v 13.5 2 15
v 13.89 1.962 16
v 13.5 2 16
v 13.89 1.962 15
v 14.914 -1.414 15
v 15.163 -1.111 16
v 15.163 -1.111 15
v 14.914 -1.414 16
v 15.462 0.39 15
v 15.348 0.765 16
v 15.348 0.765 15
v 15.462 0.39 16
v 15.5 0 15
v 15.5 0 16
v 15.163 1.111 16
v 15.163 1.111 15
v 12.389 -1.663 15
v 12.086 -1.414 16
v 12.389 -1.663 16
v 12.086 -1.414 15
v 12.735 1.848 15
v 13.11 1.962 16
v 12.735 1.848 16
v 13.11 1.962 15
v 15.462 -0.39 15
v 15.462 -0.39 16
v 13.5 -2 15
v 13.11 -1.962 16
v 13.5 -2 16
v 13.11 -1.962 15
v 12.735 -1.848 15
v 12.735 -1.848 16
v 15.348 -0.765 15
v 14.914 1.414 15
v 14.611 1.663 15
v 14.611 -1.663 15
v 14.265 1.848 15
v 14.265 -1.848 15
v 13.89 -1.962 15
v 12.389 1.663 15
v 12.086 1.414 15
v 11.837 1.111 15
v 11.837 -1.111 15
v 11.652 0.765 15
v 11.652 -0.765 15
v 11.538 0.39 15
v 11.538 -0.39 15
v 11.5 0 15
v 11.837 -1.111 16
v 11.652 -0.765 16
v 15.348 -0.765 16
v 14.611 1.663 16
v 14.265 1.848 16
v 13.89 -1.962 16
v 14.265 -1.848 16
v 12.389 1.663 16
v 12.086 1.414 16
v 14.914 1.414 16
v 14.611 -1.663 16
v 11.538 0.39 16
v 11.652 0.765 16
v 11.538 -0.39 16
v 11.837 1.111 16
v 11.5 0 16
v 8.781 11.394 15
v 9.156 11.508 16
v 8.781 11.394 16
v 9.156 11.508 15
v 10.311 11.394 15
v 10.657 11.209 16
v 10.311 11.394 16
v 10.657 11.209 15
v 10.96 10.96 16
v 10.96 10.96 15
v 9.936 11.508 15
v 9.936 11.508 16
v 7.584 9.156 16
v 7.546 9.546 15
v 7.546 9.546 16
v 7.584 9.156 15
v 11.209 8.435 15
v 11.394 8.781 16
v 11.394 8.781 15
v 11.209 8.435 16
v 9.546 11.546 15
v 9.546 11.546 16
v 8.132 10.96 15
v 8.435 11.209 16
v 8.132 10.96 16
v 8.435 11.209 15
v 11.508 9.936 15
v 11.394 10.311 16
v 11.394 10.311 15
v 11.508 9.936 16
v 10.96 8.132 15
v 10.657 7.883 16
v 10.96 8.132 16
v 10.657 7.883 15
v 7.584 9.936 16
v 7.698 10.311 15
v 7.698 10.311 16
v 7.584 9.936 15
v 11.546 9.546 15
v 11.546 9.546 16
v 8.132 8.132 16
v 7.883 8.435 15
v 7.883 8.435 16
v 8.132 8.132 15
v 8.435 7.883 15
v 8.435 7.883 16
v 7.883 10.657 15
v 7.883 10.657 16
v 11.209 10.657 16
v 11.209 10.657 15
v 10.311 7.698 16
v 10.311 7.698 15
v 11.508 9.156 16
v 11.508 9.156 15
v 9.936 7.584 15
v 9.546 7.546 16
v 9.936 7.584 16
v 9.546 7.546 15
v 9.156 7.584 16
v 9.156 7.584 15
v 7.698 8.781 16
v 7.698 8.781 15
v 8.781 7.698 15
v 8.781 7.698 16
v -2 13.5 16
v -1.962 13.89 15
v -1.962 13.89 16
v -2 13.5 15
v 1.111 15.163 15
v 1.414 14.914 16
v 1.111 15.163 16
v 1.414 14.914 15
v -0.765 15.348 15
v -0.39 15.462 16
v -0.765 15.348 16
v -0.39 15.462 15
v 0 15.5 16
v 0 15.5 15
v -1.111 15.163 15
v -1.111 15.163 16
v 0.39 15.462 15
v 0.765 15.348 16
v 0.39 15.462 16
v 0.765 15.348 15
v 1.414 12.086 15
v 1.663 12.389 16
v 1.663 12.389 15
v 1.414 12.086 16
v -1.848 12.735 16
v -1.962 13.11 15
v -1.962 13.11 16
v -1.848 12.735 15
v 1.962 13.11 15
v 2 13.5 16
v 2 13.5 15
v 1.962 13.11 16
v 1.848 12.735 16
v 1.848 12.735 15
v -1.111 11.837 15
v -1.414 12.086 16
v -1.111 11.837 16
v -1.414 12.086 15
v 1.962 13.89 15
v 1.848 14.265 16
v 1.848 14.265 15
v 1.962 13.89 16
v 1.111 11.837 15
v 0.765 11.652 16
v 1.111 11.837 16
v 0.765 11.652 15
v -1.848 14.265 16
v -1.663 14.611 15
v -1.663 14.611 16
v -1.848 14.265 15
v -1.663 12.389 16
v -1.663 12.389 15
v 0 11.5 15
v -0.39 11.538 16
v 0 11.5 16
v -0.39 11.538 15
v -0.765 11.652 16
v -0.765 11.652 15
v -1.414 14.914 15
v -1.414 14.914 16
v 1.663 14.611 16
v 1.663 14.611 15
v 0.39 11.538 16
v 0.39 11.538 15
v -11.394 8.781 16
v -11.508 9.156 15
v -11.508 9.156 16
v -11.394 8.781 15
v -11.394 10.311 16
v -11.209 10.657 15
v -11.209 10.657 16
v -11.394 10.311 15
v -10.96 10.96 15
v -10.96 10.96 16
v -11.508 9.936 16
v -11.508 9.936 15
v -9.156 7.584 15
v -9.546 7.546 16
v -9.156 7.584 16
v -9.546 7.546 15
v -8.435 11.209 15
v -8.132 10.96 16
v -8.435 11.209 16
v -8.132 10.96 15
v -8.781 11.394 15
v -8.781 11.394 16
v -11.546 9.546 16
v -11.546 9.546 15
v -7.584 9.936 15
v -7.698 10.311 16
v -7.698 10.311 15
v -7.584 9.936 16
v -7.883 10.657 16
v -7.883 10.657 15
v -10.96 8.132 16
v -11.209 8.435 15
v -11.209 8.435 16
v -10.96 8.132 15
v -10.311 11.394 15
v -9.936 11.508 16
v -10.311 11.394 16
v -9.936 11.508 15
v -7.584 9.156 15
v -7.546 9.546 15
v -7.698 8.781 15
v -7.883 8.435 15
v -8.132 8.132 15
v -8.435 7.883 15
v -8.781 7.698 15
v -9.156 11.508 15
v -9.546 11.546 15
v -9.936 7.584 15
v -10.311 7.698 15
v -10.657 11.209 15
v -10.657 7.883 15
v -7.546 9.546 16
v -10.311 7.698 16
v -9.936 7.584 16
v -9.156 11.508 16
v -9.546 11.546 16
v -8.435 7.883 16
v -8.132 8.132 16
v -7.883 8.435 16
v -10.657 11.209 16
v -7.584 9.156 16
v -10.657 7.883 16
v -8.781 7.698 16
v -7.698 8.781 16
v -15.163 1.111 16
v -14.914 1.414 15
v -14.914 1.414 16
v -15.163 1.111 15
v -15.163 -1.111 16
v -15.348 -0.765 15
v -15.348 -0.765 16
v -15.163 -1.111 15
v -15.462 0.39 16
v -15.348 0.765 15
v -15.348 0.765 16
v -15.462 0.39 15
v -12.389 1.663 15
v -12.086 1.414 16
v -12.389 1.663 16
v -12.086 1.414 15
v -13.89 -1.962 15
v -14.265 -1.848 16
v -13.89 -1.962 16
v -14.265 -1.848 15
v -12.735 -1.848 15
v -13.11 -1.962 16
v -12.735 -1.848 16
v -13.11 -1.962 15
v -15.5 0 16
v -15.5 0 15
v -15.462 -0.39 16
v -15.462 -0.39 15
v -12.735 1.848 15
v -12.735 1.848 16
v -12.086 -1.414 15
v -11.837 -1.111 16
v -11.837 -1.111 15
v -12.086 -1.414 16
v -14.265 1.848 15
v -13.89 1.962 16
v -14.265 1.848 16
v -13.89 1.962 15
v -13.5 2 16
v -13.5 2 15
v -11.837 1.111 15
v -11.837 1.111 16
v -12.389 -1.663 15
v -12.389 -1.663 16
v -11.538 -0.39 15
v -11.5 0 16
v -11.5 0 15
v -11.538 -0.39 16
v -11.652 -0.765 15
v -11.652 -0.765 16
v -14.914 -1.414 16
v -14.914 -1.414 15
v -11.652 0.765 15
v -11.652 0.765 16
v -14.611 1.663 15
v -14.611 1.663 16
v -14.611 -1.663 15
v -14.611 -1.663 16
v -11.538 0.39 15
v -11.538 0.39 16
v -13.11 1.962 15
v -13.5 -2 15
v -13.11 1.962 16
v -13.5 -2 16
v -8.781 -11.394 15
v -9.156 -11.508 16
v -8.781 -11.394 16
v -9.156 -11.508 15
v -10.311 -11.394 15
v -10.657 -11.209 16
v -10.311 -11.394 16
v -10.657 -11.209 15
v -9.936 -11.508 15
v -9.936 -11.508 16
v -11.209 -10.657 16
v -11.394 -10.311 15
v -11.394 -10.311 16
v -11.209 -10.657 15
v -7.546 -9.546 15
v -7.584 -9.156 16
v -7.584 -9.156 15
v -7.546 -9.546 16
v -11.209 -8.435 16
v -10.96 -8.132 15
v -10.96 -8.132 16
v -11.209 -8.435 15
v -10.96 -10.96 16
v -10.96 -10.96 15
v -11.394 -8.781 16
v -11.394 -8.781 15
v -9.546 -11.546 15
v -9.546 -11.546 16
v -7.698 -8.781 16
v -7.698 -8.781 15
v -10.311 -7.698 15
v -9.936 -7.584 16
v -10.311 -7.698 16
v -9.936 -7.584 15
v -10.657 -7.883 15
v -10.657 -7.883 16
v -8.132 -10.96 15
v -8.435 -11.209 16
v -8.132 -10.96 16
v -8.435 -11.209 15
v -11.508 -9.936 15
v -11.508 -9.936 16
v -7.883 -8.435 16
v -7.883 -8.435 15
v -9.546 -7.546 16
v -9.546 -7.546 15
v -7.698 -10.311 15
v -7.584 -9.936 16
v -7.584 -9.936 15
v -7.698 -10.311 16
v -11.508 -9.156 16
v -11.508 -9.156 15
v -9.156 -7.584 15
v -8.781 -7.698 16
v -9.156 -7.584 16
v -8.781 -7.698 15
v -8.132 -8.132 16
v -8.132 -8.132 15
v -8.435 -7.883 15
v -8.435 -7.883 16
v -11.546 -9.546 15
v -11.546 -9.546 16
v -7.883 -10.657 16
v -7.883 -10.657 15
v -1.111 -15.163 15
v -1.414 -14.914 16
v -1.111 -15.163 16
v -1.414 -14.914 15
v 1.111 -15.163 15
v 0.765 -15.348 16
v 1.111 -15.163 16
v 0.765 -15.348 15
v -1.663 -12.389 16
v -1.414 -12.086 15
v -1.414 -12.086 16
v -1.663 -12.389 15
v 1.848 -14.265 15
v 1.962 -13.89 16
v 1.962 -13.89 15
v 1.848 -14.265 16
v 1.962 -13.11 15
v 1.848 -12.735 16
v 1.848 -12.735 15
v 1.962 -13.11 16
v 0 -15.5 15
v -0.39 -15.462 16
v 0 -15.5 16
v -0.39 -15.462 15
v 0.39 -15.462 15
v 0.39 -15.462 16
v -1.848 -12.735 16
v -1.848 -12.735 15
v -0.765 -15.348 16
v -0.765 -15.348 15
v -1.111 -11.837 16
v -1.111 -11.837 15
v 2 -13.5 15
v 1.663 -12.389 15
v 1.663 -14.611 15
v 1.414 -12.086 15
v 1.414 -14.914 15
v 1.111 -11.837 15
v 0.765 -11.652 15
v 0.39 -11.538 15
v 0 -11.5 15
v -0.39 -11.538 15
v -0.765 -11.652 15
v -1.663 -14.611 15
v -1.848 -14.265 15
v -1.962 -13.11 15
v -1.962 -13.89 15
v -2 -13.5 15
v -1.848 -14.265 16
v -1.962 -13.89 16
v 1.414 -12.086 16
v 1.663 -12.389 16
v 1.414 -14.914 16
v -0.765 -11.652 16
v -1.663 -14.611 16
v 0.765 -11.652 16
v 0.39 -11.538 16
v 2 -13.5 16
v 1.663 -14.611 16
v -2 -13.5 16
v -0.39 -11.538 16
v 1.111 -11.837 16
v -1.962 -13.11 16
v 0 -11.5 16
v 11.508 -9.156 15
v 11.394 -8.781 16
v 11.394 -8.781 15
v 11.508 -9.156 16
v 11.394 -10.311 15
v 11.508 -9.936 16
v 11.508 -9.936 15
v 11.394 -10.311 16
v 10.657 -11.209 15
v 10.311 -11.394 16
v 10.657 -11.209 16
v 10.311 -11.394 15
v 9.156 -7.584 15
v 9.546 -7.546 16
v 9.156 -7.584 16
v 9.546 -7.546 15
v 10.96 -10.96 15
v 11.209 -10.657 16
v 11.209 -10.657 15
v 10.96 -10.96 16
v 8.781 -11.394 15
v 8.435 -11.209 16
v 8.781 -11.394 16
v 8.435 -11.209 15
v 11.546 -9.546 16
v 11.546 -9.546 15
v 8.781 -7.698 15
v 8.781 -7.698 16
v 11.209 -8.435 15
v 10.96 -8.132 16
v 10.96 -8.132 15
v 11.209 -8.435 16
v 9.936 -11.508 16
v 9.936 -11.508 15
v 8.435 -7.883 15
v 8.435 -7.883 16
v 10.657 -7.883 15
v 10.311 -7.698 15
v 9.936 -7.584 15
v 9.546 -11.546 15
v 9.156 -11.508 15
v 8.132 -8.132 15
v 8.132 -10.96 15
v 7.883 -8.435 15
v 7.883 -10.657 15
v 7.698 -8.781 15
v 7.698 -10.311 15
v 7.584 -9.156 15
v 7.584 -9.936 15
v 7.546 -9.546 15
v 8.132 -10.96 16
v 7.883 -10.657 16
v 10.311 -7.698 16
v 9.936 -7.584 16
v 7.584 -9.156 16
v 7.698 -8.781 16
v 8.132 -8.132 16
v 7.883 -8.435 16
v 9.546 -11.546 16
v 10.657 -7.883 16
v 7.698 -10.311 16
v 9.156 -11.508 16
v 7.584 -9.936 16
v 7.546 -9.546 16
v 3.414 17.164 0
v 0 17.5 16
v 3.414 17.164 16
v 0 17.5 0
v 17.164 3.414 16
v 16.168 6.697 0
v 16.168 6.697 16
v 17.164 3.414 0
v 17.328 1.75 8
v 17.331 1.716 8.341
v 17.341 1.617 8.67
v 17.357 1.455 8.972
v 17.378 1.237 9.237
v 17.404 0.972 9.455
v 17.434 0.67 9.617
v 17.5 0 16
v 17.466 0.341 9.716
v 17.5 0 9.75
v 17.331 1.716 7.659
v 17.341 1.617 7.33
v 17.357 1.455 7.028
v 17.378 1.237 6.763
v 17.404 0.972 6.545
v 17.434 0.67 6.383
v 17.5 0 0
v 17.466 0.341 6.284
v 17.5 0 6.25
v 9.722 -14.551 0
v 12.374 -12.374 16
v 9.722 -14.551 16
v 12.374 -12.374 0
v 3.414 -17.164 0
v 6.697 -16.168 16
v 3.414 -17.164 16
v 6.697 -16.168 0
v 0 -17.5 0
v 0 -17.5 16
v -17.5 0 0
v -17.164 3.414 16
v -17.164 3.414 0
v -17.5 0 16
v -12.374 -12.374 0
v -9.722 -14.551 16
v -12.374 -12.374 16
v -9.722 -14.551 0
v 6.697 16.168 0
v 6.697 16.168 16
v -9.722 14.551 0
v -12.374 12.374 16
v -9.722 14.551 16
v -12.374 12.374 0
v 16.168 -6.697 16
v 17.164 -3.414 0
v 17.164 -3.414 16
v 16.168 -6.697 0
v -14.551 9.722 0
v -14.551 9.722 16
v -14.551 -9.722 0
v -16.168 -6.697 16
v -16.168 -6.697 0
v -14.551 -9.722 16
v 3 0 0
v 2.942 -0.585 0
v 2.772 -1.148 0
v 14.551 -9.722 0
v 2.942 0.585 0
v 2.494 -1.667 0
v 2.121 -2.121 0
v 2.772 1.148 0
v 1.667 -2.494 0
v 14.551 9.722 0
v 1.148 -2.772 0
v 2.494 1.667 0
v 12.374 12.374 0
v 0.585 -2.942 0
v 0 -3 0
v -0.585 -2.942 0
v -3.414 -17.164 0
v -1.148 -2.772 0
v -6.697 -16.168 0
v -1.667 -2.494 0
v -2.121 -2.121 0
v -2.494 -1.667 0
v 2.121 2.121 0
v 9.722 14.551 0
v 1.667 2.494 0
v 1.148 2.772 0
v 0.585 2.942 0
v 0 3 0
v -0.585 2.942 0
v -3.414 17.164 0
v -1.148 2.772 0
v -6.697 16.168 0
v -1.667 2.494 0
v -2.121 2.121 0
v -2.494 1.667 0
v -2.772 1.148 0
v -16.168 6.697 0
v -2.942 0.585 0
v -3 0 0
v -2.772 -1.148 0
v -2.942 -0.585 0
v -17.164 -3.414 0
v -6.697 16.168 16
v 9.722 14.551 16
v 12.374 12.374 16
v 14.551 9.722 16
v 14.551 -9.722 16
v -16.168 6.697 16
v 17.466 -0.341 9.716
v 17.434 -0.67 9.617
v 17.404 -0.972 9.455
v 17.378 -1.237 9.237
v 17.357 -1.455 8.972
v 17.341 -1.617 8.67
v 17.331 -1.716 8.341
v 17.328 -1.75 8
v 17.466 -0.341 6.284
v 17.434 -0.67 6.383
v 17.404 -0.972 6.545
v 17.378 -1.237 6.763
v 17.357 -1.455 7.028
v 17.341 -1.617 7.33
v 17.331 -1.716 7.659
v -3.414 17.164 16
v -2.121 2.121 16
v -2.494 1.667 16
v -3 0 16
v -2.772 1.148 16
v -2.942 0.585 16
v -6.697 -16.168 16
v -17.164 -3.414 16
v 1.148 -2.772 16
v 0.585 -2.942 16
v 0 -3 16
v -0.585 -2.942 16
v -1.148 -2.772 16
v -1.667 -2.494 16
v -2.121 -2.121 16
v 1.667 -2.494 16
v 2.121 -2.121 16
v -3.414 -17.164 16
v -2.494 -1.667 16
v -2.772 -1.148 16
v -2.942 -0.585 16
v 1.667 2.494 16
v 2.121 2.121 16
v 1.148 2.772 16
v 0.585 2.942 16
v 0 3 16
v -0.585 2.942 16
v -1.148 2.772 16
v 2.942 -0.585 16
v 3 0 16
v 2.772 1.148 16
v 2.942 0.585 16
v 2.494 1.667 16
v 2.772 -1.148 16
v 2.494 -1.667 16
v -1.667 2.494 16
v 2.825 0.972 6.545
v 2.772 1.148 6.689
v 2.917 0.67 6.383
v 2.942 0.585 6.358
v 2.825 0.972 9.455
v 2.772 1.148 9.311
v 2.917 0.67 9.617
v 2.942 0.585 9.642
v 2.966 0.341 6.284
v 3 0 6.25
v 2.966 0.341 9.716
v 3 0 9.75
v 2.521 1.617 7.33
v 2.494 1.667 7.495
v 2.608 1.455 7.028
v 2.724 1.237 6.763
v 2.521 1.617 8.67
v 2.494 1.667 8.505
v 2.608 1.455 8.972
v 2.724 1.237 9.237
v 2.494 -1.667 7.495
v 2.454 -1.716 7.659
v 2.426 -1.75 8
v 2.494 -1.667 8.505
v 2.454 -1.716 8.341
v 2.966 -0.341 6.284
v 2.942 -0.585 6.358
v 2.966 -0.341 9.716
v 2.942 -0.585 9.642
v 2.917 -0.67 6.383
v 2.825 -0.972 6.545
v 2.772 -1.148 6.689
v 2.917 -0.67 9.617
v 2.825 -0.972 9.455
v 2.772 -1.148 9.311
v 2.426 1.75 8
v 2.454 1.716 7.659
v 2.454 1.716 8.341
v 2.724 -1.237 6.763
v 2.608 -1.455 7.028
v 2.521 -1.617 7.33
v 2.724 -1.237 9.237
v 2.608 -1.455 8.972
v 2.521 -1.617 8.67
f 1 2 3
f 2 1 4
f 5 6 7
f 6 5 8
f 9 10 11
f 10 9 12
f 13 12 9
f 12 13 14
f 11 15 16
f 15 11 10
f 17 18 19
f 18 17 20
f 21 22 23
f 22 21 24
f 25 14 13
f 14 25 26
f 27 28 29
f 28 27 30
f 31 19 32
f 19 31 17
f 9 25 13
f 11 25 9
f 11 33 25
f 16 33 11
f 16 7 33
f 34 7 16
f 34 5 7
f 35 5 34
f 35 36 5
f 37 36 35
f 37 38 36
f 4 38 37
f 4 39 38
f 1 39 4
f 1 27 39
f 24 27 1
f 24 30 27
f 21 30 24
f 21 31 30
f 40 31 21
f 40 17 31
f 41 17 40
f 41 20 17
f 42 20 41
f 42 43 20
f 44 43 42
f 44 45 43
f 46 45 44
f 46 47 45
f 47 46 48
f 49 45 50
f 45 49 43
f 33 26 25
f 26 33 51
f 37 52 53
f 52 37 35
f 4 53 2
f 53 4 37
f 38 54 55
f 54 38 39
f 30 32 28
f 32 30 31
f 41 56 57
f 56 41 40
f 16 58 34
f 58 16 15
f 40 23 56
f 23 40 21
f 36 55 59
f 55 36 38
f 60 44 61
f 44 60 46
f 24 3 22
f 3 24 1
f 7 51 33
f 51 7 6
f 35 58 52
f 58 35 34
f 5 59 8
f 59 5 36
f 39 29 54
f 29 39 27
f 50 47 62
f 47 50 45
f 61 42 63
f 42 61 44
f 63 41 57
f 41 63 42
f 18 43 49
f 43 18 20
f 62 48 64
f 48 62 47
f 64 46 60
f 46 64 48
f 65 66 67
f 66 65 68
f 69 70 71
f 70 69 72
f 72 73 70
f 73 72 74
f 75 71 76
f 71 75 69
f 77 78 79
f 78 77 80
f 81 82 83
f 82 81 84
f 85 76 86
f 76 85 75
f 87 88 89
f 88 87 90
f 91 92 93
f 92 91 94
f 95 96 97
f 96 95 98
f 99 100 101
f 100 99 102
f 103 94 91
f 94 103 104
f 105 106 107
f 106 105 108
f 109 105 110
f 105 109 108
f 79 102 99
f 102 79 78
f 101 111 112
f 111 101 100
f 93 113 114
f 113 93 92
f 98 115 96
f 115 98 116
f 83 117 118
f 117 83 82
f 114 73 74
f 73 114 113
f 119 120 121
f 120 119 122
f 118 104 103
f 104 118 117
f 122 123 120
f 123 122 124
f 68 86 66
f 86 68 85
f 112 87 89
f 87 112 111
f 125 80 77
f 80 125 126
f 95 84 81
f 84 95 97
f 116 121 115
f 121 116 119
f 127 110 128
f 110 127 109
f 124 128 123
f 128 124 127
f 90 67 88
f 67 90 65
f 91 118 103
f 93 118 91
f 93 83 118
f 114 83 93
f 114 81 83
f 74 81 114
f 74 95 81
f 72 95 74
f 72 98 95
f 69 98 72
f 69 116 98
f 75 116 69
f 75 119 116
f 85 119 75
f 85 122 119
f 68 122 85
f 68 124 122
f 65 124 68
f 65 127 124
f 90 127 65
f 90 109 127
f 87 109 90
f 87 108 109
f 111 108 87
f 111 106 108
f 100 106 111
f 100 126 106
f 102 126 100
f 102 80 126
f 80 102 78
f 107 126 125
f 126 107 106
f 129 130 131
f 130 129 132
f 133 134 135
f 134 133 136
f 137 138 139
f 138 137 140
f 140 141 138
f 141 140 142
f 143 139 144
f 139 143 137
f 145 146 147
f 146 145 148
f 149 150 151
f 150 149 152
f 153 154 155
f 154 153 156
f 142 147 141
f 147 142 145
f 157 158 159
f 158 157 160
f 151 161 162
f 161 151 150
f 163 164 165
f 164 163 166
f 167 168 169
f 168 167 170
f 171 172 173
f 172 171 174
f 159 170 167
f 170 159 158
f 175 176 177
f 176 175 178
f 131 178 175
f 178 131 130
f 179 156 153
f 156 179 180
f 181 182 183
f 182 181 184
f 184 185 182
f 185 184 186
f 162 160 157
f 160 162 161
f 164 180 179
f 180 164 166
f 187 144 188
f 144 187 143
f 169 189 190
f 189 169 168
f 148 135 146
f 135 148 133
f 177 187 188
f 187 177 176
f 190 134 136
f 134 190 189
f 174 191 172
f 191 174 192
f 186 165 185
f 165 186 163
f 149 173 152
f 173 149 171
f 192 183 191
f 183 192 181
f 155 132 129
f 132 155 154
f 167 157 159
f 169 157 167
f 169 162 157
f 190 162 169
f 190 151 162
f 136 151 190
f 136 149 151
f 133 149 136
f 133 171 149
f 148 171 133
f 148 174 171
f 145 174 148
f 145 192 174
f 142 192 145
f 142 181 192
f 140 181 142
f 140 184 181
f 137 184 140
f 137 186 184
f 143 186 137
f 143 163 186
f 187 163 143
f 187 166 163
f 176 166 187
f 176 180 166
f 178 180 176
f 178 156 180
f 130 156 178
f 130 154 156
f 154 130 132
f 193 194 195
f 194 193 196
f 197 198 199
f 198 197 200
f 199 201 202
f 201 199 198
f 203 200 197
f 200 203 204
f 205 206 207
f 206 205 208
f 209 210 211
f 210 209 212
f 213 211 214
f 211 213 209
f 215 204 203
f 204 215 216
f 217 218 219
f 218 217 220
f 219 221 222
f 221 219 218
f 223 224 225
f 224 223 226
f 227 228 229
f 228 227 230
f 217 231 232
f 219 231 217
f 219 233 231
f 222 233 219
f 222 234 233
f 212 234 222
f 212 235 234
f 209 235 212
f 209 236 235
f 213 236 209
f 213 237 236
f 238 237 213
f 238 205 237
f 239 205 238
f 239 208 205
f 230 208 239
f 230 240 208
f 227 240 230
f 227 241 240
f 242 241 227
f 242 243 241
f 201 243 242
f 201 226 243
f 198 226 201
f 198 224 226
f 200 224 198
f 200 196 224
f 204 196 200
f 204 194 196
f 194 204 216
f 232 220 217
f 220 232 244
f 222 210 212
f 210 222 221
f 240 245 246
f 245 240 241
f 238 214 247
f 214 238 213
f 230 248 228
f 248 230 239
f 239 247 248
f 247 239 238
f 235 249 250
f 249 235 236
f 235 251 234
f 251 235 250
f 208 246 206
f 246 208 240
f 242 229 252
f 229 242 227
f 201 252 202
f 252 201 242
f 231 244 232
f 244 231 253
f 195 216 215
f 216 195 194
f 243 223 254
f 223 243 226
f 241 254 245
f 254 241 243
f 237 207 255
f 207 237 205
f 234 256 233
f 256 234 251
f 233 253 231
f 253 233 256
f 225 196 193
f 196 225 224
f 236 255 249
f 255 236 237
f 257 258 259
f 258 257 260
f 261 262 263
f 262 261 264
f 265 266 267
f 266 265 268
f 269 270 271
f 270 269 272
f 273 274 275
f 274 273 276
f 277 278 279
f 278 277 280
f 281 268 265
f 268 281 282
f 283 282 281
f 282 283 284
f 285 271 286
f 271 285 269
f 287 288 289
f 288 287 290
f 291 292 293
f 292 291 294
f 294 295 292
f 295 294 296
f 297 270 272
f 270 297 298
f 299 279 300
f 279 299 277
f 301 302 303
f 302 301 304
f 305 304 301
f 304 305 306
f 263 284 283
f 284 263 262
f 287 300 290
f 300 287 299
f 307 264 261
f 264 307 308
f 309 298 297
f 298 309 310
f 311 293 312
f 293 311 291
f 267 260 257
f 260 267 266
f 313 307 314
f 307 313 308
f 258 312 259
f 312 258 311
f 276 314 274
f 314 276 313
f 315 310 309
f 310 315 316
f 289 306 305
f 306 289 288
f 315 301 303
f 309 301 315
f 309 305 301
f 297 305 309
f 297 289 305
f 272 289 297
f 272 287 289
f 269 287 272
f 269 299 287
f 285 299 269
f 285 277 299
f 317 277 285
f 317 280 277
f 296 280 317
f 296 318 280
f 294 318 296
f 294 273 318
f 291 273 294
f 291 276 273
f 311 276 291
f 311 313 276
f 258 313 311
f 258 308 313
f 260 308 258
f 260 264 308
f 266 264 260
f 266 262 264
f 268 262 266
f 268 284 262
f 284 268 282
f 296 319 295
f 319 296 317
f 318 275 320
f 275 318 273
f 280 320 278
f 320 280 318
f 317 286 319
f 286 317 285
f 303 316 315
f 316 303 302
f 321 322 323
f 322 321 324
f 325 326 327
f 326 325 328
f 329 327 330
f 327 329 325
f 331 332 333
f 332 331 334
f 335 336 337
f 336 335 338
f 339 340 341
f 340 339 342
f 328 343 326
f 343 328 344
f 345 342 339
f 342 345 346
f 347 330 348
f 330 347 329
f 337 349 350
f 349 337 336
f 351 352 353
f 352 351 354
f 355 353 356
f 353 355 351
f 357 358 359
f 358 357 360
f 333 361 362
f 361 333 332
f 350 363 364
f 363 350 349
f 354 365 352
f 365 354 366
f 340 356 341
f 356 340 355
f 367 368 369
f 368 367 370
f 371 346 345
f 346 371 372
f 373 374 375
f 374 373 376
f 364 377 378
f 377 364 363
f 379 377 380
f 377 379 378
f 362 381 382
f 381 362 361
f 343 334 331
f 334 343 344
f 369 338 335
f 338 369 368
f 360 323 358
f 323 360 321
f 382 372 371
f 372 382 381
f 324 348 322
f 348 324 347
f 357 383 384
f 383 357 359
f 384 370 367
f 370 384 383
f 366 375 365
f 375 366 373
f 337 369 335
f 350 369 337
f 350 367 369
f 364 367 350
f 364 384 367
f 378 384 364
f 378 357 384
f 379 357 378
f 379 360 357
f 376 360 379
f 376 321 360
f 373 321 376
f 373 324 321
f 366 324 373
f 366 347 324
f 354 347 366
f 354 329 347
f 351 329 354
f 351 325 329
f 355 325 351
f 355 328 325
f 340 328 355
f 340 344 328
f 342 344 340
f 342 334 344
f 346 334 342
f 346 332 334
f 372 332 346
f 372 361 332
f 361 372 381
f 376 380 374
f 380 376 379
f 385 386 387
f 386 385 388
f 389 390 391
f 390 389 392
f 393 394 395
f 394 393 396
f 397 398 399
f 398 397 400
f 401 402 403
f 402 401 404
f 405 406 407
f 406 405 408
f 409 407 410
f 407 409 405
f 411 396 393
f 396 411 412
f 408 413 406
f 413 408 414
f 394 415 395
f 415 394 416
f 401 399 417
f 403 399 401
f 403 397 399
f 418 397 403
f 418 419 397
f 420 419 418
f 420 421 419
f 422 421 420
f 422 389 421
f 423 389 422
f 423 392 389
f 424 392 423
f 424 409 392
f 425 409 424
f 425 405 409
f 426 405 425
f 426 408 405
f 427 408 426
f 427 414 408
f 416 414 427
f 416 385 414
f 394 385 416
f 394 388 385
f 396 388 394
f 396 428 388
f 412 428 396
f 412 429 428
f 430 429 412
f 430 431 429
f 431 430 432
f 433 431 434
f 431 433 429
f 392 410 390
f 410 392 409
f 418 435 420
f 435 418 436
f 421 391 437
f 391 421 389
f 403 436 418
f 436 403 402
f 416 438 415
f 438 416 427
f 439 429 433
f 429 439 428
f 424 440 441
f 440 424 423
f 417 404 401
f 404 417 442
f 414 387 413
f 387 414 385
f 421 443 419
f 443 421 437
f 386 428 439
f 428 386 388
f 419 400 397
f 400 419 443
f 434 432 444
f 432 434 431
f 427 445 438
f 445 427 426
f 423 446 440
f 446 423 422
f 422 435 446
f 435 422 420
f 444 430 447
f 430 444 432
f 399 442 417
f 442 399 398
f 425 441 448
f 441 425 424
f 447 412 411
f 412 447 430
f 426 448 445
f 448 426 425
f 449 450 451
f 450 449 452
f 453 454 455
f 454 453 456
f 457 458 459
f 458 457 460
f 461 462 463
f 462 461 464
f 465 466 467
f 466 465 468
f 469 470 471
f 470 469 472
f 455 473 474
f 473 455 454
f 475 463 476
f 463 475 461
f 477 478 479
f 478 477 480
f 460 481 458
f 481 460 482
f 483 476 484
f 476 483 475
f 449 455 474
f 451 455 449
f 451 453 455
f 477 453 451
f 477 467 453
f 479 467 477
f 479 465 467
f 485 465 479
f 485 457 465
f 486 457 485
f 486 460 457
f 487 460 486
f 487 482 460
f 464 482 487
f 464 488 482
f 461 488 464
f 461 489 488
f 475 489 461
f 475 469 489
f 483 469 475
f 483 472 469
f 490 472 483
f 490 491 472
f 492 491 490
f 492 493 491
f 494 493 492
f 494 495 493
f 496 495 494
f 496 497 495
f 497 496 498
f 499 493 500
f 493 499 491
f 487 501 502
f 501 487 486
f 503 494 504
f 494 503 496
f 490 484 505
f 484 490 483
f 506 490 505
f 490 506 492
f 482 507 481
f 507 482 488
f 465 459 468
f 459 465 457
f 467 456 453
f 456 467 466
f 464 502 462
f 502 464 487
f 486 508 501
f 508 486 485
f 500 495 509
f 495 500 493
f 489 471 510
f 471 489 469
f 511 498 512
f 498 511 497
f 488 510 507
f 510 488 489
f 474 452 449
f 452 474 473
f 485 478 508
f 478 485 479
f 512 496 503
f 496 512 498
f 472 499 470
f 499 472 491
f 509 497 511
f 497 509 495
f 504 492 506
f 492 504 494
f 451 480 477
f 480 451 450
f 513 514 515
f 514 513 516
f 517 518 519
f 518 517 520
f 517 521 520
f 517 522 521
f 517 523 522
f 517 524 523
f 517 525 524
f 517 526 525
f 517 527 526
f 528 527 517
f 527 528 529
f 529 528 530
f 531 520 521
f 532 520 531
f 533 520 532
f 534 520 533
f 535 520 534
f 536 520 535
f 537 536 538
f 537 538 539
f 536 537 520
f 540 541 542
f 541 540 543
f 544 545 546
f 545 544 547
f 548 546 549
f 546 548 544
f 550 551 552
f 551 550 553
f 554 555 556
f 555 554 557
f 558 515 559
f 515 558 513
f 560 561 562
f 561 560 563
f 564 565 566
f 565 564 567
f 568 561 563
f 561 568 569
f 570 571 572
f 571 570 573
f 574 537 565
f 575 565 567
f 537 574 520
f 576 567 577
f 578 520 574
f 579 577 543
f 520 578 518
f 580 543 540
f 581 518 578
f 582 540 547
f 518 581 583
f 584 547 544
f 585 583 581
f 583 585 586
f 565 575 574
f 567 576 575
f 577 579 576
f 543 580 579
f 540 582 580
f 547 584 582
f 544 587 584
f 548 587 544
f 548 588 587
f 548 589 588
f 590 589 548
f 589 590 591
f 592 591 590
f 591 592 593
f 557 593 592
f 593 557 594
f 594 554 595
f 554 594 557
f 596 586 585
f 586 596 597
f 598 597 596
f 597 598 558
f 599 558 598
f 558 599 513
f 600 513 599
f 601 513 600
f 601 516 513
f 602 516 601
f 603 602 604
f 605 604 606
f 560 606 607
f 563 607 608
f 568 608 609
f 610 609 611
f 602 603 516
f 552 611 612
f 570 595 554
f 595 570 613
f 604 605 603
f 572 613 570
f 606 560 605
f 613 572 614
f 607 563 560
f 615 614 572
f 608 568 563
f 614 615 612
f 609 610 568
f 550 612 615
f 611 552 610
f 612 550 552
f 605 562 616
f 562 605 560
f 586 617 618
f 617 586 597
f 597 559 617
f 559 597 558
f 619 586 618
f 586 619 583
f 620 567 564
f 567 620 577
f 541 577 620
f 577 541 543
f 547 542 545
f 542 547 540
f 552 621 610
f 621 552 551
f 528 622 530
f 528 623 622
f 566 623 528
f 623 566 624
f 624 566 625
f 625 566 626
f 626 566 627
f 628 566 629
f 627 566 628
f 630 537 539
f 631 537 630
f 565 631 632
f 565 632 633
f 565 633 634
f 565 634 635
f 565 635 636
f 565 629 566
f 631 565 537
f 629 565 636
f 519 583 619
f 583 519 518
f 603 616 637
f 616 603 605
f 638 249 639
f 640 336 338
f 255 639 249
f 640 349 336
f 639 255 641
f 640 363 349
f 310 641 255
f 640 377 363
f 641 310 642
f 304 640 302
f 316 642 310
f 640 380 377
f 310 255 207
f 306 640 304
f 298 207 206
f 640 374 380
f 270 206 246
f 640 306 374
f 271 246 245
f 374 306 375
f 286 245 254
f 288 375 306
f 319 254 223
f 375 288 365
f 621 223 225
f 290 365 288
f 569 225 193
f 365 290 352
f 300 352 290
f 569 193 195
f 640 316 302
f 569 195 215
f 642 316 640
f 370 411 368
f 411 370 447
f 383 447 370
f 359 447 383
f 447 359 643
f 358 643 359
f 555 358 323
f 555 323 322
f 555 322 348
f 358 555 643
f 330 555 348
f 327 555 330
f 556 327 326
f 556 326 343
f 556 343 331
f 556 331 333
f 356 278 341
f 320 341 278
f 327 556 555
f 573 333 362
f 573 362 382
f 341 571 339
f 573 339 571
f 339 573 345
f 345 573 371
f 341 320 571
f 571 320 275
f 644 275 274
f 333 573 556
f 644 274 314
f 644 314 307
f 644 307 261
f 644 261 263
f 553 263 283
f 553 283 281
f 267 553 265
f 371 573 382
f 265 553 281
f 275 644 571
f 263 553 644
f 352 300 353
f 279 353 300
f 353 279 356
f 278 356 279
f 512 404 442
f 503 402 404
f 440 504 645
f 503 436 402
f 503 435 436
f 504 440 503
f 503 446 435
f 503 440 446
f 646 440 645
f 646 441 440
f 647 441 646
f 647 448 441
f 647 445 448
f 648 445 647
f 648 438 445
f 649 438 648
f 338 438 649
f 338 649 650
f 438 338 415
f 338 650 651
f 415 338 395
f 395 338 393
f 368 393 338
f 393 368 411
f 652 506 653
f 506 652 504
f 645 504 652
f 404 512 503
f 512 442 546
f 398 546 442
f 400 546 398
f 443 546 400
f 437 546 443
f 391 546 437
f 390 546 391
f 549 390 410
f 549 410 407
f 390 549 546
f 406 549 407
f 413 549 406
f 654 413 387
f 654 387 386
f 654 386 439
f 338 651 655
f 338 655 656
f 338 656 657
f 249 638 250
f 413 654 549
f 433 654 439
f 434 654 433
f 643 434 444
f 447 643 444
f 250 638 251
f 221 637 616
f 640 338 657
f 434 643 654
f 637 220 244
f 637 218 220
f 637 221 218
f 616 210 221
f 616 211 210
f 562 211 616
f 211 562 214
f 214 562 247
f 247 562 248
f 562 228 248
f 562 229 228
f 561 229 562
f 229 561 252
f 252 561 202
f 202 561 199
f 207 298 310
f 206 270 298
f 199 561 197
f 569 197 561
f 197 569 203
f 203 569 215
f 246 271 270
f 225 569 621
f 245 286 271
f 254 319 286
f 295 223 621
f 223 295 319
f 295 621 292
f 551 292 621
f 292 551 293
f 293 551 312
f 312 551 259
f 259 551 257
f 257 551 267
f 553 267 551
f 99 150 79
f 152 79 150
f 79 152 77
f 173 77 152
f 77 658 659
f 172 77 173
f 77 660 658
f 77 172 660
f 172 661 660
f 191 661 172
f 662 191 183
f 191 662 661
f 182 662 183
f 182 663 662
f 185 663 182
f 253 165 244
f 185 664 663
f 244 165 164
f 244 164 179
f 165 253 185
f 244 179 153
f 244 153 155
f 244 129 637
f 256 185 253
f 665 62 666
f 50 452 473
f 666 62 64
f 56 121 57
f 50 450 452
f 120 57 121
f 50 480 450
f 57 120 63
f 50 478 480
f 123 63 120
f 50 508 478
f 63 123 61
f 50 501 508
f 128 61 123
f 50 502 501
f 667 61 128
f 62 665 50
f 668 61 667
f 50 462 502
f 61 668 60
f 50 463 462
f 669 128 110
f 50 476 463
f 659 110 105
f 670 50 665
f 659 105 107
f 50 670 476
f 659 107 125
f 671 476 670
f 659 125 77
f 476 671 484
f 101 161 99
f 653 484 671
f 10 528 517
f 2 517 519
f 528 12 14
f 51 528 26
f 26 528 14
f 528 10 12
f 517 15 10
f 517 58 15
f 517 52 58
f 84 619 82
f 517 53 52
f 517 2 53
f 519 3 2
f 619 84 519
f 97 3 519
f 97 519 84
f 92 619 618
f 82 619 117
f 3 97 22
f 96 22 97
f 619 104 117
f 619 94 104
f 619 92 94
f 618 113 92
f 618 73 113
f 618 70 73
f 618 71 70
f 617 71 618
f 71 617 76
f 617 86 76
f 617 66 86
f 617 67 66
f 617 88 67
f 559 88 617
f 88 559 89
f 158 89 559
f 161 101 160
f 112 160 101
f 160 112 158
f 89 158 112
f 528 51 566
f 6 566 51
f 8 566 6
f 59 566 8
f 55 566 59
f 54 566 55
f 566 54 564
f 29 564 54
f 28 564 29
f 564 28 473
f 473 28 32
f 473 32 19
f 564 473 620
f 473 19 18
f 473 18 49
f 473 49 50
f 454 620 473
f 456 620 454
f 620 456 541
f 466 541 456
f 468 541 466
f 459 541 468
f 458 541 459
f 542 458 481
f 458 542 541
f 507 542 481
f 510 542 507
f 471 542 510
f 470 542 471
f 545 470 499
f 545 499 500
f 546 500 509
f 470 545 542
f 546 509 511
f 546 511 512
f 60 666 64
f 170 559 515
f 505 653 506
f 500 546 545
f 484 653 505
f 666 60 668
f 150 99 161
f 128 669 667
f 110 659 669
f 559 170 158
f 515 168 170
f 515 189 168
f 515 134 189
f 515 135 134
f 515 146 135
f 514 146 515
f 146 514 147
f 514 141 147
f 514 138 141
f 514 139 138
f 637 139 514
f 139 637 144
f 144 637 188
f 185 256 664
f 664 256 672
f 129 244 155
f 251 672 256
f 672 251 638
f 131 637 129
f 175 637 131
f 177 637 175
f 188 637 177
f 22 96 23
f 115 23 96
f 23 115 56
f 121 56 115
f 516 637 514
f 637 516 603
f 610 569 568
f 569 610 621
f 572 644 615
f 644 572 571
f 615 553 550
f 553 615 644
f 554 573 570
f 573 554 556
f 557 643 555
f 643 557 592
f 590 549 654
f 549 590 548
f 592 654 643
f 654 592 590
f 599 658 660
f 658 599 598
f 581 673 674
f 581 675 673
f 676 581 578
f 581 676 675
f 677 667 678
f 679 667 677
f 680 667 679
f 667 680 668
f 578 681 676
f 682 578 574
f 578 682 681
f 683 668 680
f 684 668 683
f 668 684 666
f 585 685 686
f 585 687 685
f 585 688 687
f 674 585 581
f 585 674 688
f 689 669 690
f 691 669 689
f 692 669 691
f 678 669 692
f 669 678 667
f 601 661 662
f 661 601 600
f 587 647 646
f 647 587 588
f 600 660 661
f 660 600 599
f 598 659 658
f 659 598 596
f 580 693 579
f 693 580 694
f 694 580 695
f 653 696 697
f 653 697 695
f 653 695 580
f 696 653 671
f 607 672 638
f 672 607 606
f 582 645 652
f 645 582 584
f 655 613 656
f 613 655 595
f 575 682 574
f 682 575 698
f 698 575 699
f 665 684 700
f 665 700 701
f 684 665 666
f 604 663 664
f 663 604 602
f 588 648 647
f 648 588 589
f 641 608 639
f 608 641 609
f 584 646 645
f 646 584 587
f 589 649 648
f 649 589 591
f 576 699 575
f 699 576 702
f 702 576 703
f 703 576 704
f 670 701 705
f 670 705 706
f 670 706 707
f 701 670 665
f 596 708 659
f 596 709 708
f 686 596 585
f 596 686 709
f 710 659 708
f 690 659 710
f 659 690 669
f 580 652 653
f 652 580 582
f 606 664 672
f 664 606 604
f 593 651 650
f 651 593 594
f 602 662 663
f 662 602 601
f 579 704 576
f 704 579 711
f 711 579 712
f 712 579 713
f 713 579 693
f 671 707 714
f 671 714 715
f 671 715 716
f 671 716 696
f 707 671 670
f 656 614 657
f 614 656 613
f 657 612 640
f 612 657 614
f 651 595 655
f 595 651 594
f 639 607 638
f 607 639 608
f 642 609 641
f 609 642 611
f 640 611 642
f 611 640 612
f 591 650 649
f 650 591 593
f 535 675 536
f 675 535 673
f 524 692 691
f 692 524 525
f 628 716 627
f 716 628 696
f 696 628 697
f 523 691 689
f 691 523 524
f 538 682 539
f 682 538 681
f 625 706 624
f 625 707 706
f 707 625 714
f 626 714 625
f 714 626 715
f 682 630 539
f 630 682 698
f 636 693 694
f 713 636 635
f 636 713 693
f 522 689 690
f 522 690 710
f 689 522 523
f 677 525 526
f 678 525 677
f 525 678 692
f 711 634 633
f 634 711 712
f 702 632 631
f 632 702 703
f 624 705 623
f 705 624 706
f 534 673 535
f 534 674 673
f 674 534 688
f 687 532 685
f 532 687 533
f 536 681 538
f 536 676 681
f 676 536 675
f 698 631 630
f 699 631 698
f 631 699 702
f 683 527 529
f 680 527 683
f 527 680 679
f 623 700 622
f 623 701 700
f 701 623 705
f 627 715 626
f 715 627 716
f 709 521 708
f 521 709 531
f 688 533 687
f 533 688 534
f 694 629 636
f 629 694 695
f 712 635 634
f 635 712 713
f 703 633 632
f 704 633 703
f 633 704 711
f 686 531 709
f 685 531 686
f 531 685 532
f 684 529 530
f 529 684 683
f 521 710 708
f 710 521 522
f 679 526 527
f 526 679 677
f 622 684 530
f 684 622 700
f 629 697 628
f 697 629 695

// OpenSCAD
$fn = 32;

// ----------------------------------------------------------------------
// Control knob: dimpled knob
// ----------------------------------------------------------------------

// --- parameters (mm) ---
dimp_d = 4;               // finger dimple diameter
n_dimp = 8;               // number of dimples
dimp_r = 13.5;            // dimple ring radius
knob_d = 35;              // knob body diameter
knob_h = 16;              // knob body height
bore_d = 6;               // shaft bore diameter
set_d = 3.5;              // set screw bore diameter
fit_tol = 0.1;            // tolerance for press fits, mm
free_tol = 0.3;           // tolerance for clearance fits, mm

dimp_step = 360 / n_dimp;  // dimple angular step

difference() {
  cylinder(h = knob_h, d = knob_d);
  translate([0, 0, -1]) cylinder(h = knob_h + 2, d = bore_d);
  translate([-1, 0, knob_h / 2]) rotate([0, 90, 0])
    cylinder(h = knob_d / 2 + bore_d / 2 + 2, d = set_d);  for (i = [0 : n_dimp - 1])
    rotate([0, 0, i * dimp_step])
      translate([dimp_r, 0, knob_h - 1])
        cylinder(h = 2, d = dimp_d);
}
